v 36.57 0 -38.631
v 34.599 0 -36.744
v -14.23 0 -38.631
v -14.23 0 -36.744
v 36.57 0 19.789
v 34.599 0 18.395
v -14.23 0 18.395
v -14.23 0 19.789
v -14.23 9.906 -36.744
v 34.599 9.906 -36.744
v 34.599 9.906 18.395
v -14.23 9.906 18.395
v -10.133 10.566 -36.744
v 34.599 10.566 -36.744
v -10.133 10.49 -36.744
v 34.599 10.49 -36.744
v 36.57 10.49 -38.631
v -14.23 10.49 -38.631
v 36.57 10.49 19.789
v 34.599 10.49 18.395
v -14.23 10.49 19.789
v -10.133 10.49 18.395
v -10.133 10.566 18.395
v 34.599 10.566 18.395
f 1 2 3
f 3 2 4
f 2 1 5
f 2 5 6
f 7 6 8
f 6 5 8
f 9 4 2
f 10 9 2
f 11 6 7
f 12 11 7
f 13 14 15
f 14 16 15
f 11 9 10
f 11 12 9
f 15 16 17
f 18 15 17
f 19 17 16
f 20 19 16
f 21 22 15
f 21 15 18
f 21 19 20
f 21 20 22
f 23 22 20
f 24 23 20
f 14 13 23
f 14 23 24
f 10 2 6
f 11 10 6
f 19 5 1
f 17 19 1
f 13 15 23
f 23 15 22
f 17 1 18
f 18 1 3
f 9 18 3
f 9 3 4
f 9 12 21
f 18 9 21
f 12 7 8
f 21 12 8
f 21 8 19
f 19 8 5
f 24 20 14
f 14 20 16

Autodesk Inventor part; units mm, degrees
ref_plane "YZ Plane" through (0, 0, 0) normal (1, 0, 0) x (0, 1, 0)
ref_plane "XZ Plane" through (0, 0, 0) normal (0, 1, 0) x (-1, 0, 0)
ref_plane "XY Plane" through (0, 0, 0) normal (0, 0, 1) x (1, 0, 0)
sketch "Sketch1" plane through (0, 0, 0) normal (0, 1, 0) x (-1, 0, 0)
  line L0 (14.2304, 19.7891) -> (-36.5696, 19.7891)
  line L1 (-36.5696, 19.7891) -> (-36.5696, -38.6309)
  line L2 (-36.5696, -38.6309) -> (14.2304, -38.6309)
  line L3 (14.2304, -38.6309) -> (14.2304, 19.7891)
  point P0 (0, 0)
  dimension "d0" = 50.8
  dimension "d1" = 58.42
extrude "Extrusion1" add sketch "Sketch1" along normal blind 10.4902
sketch "Sketch2" plane through (0, 0, 0) normal (0, -1, 0) x (1, 0, 0)
  line L0 (34.5988, 18.3949) -> (-14.5151, 18.3949)
  line L1 (-14.5151, 18.3949) -> (-14.5151, -36.7441)
  line L2 (-14.5151, -36.7441) -> (34.5988, -36.7441)
  line L3 (34.5988, -36.7441) -> (34.5988, 18.3949)
  point P0 (0, 0)
extrude "Extrusion2" cut sketch "Sketch2" against normal blind 9.906
sketch "Sketch3" plane through (0, 10.4902, 0) normal (0, 1, 0) x (1, 0, 0)
  line L0 (34.5988, 36.7441) -> (-14.2304, 36.7441) projected
  line L1 (-14.2304, -18.3949) -> (34.5988, -18.3949) projected
  line L2 (34.5988, 36.7441) -> (-10.1332, 36.7441)
  line L3 (-10.1332, 36.7441) -> (-10.1332, -18.3949)
  line L4 (-10.1332, -18.3949) -> (34.5988, -18.3949)
  line L5 (34.5988, -18.3949) -> (34.5988, 36.7441)
  point P0 (0, 0)
extrude "Extrusion3" add sketch "Sketch3" along normal blind 0.0762
properties part number "glasscover" material "Glass"
